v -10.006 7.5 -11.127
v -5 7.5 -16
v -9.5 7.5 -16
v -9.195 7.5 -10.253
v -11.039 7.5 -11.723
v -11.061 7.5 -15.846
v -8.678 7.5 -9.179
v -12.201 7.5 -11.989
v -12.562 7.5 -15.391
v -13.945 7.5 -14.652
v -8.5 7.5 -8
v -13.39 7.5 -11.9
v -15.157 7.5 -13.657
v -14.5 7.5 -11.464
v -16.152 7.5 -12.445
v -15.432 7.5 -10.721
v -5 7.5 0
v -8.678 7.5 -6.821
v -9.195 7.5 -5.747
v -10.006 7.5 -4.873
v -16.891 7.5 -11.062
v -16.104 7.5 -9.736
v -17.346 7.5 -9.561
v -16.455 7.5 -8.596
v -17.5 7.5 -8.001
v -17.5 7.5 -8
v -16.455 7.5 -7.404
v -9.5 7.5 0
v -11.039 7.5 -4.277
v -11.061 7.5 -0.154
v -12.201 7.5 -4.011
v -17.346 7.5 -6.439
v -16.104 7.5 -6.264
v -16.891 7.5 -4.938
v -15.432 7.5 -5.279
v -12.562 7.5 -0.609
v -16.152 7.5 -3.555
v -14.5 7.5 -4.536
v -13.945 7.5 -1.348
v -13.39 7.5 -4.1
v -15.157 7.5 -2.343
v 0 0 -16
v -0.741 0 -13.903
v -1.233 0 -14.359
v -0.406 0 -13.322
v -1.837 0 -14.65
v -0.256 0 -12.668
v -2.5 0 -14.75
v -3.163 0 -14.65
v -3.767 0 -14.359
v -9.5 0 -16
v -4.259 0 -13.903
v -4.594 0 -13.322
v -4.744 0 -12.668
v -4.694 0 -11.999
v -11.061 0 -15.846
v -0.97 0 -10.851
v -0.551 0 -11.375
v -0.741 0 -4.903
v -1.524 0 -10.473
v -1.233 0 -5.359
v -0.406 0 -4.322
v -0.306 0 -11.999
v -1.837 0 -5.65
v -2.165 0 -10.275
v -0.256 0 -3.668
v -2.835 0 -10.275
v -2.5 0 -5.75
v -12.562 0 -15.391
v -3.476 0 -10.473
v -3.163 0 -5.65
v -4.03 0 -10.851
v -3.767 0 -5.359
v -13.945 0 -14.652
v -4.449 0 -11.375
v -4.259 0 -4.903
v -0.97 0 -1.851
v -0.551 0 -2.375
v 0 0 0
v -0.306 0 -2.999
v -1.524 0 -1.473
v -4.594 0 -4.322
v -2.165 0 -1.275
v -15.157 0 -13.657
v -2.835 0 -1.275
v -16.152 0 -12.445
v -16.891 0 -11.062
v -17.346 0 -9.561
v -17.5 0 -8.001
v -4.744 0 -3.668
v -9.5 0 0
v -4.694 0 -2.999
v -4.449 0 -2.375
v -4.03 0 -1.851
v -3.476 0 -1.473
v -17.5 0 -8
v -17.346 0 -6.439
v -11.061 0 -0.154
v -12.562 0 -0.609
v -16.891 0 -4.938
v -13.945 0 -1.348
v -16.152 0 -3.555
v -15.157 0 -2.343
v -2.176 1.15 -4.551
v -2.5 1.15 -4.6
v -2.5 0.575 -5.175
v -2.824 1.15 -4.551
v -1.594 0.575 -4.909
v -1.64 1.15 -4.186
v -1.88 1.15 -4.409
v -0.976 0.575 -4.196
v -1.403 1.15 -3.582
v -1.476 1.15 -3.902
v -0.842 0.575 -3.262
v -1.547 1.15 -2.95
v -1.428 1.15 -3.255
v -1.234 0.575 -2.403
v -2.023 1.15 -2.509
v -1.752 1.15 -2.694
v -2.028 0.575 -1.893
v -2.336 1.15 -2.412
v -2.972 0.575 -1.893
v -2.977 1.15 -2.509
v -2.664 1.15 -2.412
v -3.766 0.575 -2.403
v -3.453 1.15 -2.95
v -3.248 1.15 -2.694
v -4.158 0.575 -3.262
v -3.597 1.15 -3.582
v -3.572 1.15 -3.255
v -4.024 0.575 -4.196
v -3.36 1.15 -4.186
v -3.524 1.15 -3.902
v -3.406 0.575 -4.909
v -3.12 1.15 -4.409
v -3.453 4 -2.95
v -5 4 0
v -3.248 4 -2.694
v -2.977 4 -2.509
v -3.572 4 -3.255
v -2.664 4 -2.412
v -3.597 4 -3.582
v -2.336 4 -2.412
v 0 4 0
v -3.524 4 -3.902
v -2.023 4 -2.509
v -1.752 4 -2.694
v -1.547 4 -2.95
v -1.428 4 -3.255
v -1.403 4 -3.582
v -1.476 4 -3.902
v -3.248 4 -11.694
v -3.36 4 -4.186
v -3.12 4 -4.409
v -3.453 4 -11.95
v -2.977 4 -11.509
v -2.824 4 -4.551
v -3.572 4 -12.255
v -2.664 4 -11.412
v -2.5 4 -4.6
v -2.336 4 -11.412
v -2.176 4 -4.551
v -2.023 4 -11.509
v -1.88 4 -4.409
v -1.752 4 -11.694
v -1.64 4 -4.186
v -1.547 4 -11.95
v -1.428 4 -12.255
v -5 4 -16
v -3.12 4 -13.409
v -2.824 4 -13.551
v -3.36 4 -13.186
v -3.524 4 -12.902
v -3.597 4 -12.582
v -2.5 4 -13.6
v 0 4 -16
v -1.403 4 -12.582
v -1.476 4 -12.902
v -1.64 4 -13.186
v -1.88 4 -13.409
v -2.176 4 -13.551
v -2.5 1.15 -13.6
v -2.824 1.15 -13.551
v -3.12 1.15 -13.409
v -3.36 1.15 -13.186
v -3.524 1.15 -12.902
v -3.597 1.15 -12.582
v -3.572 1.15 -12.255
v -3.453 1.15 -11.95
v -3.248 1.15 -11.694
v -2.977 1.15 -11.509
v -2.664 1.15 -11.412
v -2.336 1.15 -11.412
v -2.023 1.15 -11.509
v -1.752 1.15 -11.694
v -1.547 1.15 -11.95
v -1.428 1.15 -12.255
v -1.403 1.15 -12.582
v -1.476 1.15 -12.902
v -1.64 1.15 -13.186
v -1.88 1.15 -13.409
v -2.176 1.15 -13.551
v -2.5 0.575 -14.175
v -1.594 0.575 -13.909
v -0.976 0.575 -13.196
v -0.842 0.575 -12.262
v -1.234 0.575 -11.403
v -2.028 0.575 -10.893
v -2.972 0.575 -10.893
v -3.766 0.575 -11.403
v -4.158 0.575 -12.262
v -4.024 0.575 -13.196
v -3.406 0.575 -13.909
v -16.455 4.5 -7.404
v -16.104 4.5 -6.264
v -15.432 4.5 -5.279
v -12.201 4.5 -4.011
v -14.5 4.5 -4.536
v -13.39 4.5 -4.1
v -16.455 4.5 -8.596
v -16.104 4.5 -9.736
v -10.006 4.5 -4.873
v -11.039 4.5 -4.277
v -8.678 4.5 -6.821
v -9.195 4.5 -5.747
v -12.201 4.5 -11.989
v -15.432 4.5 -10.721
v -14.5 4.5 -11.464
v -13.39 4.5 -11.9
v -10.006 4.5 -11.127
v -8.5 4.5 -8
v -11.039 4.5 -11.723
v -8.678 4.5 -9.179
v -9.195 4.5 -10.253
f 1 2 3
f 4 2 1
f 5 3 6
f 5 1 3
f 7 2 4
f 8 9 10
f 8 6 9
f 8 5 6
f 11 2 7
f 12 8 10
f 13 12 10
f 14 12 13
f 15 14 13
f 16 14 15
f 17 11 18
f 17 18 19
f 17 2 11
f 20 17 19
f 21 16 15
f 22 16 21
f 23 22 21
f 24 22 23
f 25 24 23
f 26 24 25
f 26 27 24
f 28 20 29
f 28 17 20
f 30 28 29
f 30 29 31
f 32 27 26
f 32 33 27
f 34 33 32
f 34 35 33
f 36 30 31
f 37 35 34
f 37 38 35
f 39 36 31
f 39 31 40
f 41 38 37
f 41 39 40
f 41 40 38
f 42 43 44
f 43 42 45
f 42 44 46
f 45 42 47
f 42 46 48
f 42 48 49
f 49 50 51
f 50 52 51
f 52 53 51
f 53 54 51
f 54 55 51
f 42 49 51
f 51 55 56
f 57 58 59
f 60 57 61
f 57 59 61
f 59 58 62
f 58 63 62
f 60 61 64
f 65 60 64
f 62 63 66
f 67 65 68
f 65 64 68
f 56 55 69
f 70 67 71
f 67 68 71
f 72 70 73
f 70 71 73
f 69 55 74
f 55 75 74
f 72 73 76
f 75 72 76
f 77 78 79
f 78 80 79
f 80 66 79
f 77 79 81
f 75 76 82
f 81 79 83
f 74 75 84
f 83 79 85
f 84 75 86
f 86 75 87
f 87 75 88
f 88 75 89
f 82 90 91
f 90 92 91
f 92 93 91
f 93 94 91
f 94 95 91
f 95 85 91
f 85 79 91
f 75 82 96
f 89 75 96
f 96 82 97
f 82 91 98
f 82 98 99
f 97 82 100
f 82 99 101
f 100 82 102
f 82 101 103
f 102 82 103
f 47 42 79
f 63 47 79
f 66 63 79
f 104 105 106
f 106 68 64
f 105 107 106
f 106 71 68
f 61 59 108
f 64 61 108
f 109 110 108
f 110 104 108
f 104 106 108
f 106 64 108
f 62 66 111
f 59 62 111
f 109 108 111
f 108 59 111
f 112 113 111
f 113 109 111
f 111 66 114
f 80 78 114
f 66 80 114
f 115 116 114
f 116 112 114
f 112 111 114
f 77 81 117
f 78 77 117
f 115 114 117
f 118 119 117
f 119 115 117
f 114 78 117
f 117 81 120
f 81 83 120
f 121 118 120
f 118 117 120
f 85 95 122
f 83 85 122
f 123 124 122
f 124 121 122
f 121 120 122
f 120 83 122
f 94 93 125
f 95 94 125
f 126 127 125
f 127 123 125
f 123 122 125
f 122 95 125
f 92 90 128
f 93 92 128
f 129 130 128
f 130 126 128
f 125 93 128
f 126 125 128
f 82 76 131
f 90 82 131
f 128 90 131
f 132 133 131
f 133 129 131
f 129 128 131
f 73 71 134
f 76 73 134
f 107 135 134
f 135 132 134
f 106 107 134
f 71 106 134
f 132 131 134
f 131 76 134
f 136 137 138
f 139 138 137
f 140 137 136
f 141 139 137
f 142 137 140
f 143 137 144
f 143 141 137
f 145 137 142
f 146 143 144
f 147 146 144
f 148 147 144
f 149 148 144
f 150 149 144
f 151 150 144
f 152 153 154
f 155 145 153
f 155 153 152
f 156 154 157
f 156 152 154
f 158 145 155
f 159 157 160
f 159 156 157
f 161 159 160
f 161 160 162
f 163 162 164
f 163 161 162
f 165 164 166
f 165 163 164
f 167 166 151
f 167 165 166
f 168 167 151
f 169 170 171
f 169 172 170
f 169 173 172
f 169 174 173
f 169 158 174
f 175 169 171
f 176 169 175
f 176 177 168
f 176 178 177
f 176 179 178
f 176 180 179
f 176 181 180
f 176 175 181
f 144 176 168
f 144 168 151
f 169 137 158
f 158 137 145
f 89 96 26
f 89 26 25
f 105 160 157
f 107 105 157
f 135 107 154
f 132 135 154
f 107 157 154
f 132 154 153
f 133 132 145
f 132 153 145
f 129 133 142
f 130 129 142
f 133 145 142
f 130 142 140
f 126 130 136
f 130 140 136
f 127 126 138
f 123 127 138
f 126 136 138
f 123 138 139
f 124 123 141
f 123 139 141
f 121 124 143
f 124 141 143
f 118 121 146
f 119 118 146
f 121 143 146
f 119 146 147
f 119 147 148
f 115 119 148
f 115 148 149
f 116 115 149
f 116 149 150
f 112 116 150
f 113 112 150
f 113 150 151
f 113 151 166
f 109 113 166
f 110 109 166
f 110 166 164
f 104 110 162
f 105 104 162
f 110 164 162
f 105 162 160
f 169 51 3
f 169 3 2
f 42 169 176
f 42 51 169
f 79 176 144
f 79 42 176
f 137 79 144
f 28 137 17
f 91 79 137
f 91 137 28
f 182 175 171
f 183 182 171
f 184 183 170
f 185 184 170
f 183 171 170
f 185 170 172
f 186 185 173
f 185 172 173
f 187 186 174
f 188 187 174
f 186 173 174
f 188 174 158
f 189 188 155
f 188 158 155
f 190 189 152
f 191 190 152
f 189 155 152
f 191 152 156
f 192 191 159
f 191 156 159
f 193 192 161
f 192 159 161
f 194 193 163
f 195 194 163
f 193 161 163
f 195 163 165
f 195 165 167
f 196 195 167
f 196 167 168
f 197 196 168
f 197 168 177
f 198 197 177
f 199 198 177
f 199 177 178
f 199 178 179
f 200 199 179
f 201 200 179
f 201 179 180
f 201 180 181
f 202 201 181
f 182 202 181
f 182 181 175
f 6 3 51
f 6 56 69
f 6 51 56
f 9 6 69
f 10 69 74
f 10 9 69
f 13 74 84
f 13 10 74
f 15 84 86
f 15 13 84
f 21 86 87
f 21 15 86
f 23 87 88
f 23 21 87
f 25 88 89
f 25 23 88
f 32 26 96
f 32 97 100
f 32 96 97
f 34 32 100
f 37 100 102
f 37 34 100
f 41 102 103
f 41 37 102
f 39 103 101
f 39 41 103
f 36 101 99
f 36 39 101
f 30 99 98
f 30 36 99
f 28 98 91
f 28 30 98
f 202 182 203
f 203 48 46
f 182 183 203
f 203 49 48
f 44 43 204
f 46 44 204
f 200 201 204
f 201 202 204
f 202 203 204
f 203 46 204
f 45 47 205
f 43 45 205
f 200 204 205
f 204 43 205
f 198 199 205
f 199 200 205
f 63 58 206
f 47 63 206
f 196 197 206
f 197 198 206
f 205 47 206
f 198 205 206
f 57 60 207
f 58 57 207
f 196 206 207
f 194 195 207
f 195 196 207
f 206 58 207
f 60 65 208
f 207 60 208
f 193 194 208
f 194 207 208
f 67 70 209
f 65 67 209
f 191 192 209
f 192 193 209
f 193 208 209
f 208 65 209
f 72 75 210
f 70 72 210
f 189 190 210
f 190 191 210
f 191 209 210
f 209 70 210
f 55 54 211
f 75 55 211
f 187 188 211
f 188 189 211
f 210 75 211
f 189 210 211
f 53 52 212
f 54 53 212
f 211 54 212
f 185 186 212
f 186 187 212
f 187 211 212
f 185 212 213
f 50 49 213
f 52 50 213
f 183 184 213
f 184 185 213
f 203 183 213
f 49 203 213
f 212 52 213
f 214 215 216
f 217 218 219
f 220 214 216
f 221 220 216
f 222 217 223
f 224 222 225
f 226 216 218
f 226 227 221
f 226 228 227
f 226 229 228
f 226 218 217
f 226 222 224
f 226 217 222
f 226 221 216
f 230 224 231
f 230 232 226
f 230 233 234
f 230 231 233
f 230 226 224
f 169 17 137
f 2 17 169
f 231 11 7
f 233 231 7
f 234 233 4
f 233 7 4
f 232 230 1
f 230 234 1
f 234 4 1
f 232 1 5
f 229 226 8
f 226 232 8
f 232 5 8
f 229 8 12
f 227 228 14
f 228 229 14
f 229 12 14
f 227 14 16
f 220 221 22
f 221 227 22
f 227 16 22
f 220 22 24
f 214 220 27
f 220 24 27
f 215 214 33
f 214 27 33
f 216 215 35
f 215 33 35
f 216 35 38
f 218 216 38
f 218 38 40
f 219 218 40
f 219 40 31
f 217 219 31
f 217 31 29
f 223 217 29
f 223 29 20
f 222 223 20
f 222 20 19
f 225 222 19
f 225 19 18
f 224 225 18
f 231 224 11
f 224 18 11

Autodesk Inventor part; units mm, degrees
ref_plane "YZ Plane" through (0, 0, 0) normal (1, 0, 0) x (0, 1, 0)
ref_plane "XZ Plane" through (0, 0, 0) normal (0, 1, 0) x (-1, 0, 0)
ref_plane "XY Plane" through (0, 0, 0) normal (0, 0, 1) x (1, 0, 0)
sketch "Эскиз1" plane through (0, 0, 0) normal (0, 1, 0) x (-1, 0, 0)
  line L0 (0, 0) -> (17.5, 0)
  line L1 (17.5, 0) -> (17.5, -16)
  line L2 (17.5, -16) -> (0, -16)
  line L3 (0, -16) -> (0, 0)
  dimension "d0" = 17.5
  dimension "d1" = 16
extrude "Выдавливание1" add sketch "Эскиз1" along normal blind 7.5
sketch "Эскиз2" plane through (0, 7.5, 0) normal (0, 1, 0) x (1, 0, 0)
  line L0 (-17.5, 16) -> (-17.5, 0) projected
  line L1 (-17.5, 8) -> (-12.5, 8)
  circle A0 centre (-12.5, 8) radius 4
  point P0 (0, 0)
  dimension "d4" = 5
  dimension "d5" = 8
extrude "Выдавливание2" cut sketch "Эскиз2" against normal blind 3
fillet "Сопряжение1" radius 8 2 edges at (-17.5, 3.75, 0) (-17.5, 3.75, -16)
sketch "Эскиз3" plane through (0, 0, 0) normal (0, -1, 0) x (1, 0, 0)
  line L0 (0, 0) -> (0, -16) projected
  line L1 (0, -8) -> (-2.5, -8)
  line L2 (-2.5, -3.5) -> (-2.5, -12.5)
  dimension "d9" = 2.5
  dimension "d10" = 9
hole "Отверстие1" at (-2.5, 0, -3.5) at (-2.5, 0, -12.5) direction (0, 1, 0) diameter 2.2 end through all countersink diameter 4.5 countersink angle 90
sketch "Эскиз4" plane through (0, 7.5, 0) normal (0, 1, 0) x (1, 0, 0)
  line L0 (0, 0) -> (-5, 0)
  line L1 (-5, 0) -> (-5, 16)
  line L2 (-5, 16) -> (0, 16)
  line L3 (0, 16) -> (0, 0)
  line L4 (0, 16) -> (-9.5, 16) projected
  dimension "d18" = 5
extrude "Выдавливание3" cut sketch "Эскиз4" against normal blind 3.5
properties part number "Деталь основы рулевого управления"
